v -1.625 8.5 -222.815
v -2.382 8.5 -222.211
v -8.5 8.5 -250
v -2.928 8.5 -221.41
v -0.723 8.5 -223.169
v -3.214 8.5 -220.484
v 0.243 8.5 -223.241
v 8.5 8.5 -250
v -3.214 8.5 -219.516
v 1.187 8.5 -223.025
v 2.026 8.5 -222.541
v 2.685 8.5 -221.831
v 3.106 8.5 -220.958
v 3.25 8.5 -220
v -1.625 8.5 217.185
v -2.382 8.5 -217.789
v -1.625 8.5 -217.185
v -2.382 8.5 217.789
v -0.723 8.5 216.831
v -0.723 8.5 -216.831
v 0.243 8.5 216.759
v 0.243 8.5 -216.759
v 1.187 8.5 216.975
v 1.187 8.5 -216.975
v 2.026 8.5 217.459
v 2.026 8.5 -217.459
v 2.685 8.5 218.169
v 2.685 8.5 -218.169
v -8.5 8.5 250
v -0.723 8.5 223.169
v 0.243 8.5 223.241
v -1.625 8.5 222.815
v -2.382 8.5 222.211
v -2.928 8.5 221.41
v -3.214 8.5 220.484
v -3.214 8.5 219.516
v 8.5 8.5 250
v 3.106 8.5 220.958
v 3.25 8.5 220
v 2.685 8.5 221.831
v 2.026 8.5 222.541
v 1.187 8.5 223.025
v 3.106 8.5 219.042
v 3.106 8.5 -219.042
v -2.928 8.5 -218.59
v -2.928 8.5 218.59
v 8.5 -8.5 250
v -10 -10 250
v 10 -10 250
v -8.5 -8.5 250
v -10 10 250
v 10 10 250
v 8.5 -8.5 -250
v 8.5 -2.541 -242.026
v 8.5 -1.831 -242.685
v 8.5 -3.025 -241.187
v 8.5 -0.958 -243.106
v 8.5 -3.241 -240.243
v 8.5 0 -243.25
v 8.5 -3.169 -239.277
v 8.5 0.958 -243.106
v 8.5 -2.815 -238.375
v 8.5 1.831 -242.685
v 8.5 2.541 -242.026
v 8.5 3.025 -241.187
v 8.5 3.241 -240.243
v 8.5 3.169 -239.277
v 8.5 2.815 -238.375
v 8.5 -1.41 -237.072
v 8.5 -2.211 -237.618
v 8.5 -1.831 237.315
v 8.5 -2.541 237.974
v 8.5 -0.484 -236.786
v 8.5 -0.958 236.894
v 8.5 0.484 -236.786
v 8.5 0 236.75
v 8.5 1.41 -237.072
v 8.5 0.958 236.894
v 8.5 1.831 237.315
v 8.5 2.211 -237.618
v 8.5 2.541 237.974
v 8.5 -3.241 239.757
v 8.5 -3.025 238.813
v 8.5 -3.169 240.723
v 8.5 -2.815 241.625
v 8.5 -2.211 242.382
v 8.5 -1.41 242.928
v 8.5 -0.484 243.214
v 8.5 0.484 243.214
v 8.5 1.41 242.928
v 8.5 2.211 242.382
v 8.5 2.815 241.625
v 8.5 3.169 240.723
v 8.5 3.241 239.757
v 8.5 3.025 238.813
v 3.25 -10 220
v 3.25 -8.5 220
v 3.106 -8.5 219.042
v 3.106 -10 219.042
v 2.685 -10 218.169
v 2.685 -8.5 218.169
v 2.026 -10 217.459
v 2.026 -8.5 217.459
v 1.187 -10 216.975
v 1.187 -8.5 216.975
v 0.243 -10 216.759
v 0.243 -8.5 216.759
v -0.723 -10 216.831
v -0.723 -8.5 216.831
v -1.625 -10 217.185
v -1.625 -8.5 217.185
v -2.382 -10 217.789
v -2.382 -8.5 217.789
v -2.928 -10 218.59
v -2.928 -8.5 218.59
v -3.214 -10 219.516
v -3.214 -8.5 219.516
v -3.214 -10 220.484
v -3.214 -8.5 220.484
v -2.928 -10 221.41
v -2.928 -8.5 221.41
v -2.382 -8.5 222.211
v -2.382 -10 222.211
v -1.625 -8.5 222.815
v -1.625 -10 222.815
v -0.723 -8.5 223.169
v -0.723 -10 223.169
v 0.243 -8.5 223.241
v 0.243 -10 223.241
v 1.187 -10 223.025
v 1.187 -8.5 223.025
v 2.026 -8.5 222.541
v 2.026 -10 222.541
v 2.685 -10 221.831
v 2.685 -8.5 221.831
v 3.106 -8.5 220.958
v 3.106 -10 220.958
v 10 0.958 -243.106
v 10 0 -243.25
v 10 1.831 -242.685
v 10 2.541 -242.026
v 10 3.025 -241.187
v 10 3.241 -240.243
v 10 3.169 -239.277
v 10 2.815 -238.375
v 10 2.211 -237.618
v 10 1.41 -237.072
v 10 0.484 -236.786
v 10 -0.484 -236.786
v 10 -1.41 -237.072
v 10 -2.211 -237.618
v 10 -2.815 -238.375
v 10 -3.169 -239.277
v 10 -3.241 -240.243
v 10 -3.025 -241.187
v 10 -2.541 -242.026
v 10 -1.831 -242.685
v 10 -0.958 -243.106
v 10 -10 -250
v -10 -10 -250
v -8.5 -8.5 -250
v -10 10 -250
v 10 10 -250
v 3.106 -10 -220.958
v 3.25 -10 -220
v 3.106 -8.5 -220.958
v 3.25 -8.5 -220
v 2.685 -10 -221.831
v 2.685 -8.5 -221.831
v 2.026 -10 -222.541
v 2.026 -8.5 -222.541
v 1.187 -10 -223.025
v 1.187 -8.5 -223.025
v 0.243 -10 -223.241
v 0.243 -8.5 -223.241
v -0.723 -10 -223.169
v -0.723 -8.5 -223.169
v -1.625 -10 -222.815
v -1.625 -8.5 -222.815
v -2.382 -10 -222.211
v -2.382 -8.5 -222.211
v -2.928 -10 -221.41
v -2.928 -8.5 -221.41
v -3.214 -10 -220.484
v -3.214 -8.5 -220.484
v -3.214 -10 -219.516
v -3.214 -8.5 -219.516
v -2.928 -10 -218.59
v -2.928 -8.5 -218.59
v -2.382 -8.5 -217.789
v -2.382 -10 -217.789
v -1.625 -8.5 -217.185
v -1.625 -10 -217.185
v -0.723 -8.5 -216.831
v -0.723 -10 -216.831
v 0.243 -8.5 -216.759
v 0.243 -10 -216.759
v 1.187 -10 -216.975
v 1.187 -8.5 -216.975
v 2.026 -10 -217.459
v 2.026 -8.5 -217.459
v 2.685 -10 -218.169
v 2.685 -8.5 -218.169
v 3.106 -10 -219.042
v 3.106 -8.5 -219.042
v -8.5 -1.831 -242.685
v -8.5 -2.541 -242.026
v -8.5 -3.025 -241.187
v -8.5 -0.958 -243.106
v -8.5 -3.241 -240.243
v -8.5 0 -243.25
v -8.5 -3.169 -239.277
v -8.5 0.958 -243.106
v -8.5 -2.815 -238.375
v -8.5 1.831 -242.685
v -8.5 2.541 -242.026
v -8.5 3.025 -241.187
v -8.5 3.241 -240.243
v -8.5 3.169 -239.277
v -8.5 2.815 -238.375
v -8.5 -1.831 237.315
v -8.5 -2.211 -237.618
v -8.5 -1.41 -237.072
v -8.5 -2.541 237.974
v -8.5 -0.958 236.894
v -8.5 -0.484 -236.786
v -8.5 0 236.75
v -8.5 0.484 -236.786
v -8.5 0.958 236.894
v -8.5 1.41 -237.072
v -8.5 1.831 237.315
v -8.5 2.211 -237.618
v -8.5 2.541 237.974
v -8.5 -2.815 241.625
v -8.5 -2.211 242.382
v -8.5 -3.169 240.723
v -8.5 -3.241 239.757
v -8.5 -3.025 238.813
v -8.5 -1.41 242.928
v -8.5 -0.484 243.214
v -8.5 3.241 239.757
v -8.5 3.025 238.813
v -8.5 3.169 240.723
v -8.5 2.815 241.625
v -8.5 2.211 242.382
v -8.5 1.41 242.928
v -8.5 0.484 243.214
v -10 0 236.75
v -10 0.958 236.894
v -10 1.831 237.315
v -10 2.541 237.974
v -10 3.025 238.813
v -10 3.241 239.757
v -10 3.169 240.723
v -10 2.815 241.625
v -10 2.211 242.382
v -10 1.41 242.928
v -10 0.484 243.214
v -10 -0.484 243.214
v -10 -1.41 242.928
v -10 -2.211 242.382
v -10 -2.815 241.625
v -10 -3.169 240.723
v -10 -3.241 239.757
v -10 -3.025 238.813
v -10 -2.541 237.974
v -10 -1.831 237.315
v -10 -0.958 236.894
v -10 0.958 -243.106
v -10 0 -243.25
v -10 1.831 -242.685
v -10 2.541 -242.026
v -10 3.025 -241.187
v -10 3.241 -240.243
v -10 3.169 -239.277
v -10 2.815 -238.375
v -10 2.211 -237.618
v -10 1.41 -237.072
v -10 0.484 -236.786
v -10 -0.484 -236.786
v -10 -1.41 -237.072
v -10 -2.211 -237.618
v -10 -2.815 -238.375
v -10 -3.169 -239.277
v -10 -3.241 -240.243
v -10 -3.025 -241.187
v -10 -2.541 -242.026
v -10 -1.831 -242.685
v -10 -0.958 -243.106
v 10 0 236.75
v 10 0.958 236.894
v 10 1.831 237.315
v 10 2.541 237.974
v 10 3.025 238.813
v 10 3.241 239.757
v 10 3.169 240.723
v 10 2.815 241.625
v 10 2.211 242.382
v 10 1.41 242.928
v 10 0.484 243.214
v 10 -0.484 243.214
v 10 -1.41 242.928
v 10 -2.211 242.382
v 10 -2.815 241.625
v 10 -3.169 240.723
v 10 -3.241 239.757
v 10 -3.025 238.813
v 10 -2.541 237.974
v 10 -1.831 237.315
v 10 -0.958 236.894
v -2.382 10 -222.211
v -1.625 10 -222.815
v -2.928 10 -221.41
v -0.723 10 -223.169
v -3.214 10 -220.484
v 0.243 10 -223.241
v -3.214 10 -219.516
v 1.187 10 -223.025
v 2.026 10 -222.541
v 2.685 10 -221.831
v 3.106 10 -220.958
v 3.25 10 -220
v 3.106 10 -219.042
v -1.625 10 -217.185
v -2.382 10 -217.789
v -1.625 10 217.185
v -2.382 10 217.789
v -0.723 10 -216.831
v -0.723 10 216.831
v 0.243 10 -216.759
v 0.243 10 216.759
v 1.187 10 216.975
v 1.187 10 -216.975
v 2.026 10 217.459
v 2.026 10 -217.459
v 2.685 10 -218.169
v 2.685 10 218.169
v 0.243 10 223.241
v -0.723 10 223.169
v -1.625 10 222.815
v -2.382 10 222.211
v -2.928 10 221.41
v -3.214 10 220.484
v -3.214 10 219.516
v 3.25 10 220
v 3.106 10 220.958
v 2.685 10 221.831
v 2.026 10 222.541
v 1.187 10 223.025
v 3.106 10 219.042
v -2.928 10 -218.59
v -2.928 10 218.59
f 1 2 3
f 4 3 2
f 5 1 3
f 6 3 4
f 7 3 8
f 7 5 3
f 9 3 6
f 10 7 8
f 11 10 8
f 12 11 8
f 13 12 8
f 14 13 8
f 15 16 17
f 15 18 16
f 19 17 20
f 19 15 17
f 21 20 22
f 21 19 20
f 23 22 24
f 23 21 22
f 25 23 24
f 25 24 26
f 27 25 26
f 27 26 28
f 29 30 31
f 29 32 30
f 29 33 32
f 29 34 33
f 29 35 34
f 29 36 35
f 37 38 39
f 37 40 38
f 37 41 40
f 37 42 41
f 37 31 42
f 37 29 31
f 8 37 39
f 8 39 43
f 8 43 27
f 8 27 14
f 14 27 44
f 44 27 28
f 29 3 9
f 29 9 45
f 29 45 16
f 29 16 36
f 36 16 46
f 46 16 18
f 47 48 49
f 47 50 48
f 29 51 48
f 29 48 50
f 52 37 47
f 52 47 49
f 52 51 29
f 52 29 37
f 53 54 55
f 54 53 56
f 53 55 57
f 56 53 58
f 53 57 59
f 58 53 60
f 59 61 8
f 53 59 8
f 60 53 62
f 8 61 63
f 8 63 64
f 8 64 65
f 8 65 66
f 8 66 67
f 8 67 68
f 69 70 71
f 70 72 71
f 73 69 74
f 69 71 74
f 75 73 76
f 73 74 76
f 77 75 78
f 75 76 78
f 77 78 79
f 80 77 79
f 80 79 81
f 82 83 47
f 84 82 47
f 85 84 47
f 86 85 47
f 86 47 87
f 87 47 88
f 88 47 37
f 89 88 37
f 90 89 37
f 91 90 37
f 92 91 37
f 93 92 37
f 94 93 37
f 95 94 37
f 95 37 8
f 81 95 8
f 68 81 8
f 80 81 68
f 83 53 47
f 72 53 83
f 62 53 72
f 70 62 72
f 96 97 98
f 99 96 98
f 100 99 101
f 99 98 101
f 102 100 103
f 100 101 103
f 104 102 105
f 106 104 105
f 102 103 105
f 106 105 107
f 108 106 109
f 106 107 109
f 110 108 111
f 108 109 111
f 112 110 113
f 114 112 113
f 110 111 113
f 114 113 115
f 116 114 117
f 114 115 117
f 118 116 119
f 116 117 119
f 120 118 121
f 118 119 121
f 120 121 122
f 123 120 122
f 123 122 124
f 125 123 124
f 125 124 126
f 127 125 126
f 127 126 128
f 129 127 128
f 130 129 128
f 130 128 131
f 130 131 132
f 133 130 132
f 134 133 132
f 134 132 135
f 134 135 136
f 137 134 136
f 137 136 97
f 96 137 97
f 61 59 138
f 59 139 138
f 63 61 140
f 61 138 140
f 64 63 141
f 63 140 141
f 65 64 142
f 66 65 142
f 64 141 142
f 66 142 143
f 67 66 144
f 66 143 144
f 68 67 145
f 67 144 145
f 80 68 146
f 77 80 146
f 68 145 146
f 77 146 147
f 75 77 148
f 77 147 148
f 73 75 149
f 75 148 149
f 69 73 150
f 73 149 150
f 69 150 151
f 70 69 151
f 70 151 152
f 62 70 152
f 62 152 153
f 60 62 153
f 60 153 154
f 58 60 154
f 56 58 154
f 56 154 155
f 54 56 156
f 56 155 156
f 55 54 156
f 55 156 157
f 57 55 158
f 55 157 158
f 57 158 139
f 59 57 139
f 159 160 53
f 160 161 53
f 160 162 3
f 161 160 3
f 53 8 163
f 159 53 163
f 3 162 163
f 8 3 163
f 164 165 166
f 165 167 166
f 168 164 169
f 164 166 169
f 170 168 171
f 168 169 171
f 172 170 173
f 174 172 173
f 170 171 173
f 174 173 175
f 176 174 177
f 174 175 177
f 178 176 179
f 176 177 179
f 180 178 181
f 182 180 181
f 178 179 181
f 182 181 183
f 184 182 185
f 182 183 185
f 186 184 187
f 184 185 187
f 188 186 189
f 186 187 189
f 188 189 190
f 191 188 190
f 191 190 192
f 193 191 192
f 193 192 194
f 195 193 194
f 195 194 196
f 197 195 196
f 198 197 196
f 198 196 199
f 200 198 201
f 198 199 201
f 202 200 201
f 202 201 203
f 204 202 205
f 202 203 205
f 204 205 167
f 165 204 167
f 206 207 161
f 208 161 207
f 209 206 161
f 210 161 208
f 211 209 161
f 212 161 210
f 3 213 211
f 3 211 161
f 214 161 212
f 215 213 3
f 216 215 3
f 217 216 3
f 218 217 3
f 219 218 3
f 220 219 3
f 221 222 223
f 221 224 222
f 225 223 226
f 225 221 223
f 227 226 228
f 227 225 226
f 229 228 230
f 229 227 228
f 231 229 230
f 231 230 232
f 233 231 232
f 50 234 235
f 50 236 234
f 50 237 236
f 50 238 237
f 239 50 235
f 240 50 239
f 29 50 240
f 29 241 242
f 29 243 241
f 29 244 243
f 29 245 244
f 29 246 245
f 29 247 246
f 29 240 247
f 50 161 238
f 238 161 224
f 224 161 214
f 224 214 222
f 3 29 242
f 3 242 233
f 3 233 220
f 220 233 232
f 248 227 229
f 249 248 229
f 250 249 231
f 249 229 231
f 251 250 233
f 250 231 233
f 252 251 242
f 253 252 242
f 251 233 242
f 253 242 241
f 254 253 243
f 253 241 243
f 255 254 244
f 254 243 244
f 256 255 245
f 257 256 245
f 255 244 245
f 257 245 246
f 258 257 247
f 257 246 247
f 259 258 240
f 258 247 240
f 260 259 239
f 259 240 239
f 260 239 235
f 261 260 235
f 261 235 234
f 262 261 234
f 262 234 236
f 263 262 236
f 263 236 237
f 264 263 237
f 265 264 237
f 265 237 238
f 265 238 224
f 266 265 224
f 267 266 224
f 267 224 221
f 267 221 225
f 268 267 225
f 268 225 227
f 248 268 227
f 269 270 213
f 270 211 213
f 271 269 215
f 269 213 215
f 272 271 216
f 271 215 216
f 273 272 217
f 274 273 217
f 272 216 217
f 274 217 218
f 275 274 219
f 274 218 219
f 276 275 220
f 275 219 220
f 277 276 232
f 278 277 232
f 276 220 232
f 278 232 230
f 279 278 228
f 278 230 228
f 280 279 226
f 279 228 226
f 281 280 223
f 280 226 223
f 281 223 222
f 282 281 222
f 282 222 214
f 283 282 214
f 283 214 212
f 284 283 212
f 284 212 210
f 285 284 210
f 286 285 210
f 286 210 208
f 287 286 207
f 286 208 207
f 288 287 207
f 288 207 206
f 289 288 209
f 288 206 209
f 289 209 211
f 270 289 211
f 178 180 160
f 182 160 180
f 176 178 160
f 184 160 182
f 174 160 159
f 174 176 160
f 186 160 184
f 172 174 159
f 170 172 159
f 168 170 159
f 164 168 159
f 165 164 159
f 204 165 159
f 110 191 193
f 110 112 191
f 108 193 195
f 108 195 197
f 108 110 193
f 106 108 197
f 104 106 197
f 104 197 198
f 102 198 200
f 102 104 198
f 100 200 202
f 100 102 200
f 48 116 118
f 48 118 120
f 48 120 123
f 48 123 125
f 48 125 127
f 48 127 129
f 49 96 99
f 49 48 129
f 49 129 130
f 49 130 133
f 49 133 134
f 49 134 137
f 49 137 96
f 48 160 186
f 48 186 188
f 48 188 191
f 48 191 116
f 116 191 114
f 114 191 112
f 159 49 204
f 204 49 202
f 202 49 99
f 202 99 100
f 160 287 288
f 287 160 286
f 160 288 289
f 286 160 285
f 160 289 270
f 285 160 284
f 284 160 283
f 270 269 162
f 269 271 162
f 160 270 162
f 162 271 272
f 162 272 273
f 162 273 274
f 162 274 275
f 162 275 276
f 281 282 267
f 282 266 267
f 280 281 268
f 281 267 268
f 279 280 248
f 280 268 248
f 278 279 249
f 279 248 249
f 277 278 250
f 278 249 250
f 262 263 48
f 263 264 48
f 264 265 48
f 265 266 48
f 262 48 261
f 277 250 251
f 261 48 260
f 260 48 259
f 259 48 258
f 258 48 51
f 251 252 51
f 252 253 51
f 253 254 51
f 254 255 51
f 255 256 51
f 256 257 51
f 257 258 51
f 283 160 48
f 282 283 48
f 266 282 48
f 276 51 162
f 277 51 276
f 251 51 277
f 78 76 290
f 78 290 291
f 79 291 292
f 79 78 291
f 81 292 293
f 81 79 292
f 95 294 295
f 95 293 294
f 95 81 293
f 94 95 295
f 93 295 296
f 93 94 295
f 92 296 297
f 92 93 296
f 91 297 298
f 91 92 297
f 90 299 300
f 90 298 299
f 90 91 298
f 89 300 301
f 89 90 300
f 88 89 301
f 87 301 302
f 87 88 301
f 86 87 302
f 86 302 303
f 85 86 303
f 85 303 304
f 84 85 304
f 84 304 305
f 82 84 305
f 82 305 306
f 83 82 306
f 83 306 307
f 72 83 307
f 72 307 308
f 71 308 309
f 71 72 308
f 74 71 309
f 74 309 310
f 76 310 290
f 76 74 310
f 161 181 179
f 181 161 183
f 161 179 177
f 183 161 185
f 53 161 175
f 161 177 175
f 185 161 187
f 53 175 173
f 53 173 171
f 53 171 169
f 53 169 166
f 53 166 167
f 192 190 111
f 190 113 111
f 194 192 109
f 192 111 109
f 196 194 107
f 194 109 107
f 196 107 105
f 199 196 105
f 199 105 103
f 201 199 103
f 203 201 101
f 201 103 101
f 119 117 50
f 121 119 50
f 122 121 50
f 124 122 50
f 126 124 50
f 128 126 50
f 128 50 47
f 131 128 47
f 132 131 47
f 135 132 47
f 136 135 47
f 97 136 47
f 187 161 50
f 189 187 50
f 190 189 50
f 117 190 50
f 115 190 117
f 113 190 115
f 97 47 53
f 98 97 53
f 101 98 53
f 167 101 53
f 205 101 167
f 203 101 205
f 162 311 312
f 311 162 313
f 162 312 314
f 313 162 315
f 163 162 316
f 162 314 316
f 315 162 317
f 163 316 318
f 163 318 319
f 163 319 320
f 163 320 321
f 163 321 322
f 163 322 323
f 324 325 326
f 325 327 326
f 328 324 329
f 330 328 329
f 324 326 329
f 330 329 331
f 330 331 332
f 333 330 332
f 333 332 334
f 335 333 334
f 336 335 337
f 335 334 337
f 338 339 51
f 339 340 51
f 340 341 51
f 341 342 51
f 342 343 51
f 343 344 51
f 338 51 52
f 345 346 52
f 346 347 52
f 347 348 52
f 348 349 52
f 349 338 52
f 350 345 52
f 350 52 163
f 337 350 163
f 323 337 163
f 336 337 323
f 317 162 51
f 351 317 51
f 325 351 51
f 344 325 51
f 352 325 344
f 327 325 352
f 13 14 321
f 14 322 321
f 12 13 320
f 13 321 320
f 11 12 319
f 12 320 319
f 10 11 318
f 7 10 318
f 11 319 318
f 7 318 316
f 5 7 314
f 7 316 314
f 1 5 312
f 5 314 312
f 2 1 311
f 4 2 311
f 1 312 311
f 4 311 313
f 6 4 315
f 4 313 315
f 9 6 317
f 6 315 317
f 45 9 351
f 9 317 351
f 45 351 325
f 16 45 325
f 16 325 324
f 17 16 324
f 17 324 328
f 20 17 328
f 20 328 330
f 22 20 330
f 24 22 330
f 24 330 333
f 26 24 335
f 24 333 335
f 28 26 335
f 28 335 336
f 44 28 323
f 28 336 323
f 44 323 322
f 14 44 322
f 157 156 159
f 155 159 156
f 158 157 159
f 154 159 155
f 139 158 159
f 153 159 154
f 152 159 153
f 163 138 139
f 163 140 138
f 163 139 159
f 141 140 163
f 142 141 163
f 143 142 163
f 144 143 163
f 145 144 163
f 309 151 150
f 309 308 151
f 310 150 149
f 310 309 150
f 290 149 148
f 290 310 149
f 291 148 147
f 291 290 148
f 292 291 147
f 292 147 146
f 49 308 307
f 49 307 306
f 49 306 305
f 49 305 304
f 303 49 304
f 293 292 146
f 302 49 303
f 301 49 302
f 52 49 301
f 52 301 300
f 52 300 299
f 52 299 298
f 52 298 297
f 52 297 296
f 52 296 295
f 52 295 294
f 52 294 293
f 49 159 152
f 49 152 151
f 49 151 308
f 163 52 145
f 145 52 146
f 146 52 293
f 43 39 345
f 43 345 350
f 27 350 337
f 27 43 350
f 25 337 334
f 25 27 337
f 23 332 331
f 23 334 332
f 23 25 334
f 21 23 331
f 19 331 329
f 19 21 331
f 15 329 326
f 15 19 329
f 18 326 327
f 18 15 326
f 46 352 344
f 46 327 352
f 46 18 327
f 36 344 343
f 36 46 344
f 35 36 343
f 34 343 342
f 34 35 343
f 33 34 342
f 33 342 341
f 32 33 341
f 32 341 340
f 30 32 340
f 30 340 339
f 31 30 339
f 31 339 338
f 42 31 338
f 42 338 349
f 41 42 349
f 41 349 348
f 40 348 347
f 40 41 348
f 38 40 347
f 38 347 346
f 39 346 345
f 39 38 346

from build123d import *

# Parameters (mm, degrees)
SKIZZE1_W                       = 20
SKIZZE1_H                       = 20
SKIZZE1_W_2                     = 17
SKIZZE1_H_2                     = 17
AUFSATZ_LINEAR_AUSTRAGEN1_DEPTH = 250
SKIZZE2_R                       = 3.25
SCHNITT_LINEAR_AUSTRAGEN1_DEPTH = 15
SKIZZE3_R                       = 3.25
SCHNITT_LINEAR_AUSTRAGEN2_DEPTH = 15


with BuildPart() as part:
    # Skizze1 → Aufsatz-Linear austragen1 (new, symmetric)
    with BuildSketch(Plane.XY):
        Rectangle(SKIZZE1_W, SKIZZE1_H)
        Rectangle(SKIZZE1_W_2, SKIZZE1_H_2, mode=Mode.SUBTRACT)
    extrude(amount=AUFSATZ_LINEAR_AUSTRAGEN1_DEPTH, both=True)

    # Skizze2 → Schnitt-Linear austragen1 (cut, symmetric)
    with BuildSketch(Plane(origin=(0, 0, 0), x_dir=(1, 0, 0), z_dir=(0, 1, 0))):
        with Locations((0, -220)):
            Circle(SKIZZE2_R)
        with Locations((0, 220)):
            Circle(SKIZZE2_R)
    extrude(amount=SCHNITT_LINEAR_AUSTRAGEN1_DEPTH, both=True, mode=Mode.SUBTRACT)

    # Skizze3 → Schnitt-Linear austragen2 (cut, symmetric)
    with BuildSketch(Plane(origin=(0, 0, 0), x_dir=(0, 0, -1), z_dir=(1, 0, 0))):
        with Locations((-240, 0)):
            Circle(SKIZZE3_R)
        with Locations((240, 0)):
            Circle(SKIZZE3_R)
    extrude(amount=SCHNITT_LINEAR_AUSTRAGEN2_DEPTH, both=True, mode=Mode.SUBTRACT)


solid = part.part
